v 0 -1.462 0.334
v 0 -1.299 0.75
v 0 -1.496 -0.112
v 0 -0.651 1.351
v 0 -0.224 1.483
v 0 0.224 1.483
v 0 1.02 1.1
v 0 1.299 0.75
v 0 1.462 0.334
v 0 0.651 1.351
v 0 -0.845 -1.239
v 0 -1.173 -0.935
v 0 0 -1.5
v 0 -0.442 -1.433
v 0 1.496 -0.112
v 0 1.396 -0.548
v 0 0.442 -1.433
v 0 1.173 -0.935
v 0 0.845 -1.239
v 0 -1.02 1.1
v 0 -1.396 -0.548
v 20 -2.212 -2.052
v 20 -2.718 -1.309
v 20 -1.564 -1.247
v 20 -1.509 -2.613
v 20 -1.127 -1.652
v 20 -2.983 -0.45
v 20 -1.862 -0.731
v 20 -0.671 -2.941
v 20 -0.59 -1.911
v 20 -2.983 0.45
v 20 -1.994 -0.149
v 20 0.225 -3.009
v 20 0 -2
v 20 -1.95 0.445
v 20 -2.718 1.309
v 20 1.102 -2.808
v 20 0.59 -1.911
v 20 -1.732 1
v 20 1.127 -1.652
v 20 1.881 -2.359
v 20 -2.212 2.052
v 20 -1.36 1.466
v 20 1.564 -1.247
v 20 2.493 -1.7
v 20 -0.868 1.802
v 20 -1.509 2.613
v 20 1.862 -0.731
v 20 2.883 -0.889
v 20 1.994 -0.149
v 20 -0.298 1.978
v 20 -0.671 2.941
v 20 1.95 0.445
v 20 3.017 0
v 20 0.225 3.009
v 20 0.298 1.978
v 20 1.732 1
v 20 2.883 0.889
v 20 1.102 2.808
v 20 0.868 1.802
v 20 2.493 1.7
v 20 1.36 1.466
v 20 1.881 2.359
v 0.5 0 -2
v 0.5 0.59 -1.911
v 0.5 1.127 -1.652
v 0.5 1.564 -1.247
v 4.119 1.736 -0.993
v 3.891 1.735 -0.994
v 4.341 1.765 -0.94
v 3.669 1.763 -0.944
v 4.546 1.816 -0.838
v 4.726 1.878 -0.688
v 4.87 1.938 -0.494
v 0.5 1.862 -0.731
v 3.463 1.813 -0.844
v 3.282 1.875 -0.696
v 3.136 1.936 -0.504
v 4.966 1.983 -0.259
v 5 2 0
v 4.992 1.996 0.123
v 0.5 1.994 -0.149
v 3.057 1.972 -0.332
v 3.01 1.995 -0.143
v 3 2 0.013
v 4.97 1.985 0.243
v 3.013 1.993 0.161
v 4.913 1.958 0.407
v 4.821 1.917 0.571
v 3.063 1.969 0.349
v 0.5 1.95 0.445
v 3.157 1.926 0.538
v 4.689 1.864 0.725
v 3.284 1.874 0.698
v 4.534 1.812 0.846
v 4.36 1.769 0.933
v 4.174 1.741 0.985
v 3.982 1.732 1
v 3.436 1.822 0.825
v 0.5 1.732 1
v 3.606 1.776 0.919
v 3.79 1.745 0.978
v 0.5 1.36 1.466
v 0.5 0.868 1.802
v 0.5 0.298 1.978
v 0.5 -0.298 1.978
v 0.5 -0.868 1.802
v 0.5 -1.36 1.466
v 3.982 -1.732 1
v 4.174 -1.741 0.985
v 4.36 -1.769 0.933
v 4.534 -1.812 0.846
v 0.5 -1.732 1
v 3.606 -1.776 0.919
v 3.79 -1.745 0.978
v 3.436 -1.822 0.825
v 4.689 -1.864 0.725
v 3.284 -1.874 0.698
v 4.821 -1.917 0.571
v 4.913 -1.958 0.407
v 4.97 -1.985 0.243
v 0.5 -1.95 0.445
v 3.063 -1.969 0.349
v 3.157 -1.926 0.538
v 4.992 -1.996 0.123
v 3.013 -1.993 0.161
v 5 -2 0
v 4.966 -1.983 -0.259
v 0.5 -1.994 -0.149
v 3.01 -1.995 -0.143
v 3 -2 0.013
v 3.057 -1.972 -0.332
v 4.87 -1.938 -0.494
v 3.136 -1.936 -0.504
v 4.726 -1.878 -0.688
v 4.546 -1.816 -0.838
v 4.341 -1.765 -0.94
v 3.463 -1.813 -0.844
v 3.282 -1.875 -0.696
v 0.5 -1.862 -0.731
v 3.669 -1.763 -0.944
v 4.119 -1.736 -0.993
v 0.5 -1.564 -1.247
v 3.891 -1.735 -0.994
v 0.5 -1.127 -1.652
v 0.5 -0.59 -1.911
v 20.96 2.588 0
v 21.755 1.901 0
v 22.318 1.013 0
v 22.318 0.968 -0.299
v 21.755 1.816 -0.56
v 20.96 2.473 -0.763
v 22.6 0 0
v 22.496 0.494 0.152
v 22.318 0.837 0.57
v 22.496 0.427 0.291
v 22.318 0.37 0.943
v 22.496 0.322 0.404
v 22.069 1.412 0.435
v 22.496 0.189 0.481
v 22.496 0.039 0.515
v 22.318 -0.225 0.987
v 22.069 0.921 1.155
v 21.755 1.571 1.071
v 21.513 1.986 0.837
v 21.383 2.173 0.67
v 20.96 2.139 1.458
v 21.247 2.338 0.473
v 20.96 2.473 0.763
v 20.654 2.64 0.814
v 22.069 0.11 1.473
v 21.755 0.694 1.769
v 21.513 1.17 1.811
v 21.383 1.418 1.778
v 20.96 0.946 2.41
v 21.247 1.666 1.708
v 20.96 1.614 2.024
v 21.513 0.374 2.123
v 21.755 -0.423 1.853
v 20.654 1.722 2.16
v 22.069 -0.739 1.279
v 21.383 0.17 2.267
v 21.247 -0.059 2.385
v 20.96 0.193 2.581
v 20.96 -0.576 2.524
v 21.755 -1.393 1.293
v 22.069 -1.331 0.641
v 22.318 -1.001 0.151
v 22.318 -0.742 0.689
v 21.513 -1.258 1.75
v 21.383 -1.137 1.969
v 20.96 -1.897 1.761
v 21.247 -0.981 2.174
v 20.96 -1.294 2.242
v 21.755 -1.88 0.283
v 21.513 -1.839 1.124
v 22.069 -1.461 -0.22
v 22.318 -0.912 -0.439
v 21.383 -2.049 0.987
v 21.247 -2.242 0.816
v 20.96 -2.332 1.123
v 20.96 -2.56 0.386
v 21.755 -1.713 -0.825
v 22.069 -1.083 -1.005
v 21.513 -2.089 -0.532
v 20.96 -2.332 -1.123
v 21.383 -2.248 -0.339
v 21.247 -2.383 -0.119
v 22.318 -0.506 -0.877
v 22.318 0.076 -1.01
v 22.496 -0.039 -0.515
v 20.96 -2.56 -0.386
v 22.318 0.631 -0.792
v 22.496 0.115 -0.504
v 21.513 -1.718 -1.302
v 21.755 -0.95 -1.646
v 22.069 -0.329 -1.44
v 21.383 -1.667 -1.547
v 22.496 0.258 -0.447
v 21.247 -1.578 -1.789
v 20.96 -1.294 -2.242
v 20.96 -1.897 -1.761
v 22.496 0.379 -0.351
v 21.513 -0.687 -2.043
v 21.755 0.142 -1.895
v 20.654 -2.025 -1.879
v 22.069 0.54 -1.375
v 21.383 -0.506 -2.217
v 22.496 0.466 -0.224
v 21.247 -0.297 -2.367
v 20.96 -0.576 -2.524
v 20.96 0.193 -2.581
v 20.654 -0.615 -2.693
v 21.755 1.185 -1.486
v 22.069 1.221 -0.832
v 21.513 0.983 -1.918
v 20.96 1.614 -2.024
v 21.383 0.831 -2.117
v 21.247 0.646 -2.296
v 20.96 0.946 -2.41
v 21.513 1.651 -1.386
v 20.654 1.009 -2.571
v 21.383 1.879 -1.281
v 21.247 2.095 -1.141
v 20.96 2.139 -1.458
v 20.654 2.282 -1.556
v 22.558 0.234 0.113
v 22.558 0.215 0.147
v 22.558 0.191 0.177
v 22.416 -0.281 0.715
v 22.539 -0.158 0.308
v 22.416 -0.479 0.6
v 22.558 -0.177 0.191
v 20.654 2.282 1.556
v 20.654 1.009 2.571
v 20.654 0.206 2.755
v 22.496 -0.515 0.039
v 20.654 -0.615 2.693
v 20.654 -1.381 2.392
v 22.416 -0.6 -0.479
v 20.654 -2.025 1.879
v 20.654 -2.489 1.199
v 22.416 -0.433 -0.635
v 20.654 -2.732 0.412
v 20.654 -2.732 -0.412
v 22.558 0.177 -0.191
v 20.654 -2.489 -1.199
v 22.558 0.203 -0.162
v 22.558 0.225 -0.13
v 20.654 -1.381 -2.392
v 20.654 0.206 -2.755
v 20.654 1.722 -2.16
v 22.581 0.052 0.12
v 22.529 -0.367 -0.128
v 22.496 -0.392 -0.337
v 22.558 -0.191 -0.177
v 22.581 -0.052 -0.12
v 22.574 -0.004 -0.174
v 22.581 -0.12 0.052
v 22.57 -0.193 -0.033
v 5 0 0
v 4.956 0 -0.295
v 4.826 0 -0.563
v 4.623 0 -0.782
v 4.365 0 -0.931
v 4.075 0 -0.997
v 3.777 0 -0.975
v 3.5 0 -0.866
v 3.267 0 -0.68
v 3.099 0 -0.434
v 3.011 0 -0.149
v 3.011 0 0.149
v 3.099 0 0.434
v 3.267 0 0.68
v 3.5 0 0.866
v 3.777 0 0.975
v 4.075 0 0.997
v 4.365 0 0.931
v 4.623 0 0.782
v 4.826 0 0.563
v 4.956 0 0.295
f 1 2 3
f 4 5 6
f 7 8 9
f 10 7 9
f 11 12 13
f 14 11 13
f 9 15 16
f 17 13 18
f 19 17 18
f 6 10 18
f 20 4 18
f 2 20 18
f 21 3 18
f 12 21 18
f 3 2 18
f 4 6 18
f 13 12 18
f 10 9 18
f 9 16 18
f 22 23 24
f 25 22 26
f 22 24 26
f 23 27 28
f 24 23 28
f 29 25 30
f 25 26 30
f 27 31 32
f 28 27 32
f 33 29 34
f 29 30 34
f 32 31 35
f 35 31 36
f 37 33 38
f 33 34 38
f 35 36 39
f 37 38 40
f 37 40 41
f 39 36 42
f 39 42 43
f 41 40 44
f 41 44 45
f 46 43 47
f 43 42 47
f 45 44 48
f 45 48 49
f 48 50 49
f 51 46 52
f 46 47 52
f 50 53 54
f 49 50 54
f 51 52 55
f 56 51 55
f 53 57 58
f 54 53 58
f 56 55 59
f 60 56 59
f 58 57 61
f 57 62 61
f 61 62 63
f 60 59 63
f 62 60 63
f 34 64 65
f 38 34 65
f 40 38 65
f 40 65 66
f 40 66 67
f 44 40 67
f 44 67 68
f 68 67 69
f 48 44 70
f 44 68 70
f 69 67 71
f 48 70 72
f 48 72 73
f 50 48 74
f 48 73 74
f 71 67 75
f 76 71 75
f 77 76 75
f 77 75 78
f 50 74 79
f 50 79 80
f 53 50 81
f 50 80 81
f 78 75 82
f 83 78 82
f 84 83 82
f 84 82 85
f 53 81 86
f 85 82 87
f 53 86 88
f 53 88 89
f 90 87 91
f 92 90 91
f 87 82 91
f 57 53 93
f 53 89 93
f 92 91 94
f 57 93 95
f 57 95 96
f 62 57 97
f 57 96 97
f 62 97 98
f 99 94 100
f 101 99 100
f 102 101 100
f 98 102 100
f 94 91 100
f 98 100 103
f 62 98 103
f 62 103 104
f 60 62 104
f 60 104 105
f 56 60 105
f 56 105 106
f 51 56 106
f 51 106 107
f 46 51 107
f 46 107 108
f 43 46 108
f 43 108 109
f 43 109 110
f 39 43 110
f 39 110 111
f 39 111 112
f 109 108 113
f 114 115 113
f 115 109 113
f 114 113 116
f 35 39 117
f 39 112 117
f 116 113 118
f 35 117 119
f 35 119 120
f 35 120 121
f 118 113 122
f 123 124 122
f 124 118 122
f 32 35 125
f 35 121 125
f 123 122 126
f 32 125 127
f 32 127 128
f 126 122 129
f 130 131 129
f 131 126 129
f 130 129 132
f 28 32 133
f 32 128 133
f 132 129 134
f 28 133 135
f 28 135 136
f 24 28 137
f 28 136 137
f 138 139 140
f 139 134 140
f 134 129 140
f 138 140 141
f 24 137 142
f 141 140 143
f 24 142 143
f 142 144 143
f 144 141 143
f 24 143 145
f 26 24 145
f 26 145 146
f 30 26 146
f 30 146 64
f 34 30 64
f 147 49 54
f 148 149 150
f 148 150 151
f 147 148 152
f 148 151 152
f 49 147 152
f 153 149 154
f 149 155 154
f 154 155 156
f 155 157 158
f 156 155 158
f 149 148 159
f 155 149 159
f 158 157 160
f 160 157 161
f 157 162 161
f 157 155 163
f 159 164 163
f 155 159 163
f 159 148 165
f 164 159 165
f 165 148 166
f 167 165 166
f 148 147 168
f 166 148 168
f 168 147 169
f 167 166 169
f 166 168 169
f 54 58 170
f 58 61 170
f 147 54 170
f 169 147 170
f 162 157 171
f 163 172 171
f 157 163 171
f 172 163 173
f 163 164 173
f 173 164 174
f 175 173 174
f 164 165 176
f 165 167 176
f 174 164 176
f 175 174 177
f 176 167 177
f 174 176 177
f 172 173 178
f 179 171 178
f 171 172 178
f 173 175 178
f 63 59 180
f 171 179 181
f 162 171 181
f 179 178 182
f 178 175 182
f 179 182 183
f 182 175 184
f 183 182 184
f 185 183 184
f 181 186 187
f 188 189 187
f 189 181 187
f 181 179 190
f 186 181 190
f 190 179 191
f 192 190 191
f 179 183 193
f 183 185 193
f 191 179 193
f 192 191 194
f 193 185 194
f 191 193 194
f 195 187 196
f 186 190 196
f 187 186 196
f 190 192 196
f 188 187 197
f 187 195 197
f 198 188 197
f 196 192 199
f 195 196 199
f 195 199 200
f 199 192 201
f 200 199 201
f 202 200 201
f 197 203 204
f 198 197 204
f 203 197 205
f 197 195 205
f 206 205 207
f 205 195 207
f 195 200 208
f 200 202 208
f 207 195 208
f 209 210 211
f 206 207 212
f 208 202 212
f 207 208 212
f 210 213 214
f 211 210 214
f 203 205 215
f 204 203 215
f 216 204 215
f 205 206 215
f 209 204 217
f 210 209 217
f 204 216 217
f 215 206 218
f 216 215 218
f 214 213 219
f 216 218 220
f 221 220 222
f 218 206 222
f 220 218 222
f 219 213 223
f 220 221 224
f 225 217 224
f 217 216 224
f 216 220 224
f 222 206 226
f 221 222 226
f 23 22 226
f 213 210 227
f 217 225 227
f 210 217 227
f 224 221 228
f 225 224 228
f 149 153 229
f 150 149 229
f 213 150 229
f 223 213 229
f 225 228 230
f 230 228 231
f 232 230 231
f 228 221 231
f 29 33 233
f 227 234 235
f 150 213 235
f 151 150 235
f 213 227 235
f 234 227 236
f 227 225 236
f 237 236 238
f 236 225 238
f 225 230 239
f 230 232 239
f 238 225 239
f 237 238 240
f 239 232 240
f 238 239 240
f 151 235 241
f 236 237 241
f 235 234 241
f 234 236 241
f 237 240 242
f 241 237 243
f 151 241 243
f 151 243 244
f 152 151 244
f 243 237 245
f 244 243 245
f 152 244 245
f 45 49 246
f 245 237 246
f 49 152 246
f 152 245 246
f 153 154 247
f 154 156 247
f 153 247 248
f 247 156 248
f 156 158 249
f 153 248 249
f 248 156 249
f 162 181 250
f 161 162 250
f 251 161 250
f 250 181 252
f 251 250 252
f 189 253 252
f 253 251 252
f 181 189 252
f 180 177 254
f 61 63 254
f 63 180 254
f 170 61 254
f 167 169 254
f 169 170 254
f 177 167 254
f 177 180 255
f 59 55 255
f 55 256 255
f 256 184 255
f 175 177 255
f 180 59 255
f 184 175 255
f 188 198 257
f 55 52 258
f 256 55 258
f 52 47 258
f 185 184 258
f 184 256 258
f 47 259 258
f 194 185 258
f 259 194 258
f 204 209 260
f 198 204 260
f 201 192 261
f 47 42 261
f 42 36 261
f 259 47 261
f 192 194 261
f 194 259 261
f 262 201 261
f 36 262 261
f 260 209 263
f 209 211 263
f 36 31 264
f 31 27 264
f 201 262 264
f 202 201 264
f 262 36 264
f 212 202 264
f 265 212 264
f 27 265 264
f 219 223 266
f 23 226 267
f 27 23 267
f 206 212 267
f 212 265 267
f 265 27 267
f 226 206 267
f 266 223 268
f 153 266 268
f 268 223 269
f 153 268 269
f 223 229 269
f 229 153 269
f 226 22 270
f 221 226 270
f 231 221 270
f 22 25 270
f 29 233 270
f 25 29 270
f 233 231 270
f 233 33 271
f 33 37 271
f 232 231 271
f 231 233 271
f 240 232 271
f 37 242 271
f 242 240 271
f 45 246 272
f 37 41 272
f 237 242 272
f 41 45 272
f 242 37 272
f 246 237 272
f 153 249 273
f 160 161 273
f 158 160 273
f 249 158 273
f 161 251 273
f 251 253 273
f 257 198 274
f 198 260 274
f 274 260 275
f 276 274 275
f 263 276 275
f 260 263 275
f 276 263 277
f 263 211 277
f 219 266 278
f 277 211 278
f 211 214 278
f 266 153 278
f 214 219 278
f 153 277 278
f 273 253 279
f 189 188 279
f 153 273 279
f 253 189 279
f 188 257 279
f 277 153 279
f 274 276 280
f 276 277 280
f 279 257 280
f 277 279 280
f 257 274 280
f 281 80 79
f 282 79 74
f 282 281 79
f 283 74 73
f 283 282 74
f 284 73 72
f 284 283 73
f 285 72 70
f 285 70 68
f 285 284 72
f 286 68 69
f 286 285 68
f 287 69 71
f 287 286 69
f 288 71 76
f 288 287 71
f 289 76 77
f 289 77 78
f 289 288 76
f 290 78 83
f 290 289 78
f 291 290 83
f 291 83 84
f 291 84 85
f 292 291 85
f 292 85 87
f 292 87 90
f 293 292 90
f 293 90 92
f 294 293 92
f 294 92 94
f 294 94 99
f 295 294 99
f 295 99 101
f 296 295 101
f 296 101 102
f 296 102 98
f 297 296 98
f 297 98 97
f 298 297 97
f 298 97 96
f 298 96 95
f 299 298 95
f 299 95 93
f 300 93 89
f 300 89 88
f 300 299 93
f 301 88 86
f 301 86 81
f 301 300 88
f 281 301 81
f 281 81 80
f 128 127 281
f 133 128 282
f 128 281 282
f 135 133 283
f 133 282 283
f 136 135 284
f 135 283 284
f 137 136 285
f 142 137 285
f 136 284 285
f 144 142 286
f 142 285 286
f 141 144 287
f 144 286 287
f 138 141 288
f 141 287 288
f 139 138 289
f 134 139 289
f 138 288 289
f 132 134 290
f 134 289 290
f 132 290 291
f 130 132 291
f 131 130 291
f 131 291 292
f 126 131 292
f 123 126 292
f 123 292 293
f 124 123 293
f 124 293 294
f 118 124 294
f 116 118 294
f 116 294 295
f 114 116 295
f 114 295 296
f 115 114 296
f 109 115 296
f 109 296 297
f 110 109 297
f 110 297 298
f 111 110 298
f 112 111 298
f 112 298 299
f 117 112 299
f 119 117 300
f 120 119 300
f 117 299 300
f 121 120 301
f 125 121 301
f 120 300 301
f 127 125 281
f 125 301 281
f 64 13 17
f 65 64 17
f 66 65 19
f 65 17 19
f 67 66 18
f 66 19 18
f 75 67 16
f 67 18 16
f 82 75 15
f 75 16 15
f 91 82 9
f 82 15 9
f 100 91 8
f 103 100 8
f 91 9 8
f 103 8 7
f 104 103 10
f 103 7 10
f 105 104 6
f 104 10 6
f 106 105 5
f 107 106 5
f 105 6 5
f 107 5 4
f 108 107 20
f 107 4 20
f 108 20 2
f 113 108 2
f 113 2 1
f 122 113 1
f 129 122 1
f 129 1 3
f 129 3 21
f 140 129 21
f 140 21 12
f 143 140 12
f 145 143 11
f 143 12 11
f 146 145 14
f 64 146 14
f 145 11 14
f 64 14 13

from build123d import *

# Parameters (mm, degrees)
SKETCH1_R               = 2
BOSS_EXTRUDE1_DEPTH     = 20
CHAMFER1_SIZE           = 0.5
SKETCH2_R               = 1
CUT_EXTRUDE1_DEPTH      = 3
CUT_EXTRUDE1_DEPTH_BACK = 3


with BuildPart() as part:
    # Sketch1 → Boss-Extrude1 (new body)
    with BuildSketch(Plane(origin=(0, 0, 0), x_dir=(0, 0, -1), z_dir=(1, 0, 0))):
        Circle(SKETCH1_R)
    extrude(amount=BOSS_EXTRUDE1_DEPTH)

    # Chamfer1
    chamfer1_edges = [part.edges().sort_by_distance(p)[0] for p in [
        (0, 0, 2),
    ]]
    chamfer(chamfer1_edges, length=CHAMFER1_SIZE)

    # Sketch2 → Cut-Extrude1 (cut, two sides)
    with BuildSketch(Plane(origin=(0, 0, 0), x_dir=(1, 0, 0), z_dir=(0, 1, 0))) as cut_extrude1_sk:
        with Locations((4, 0)):
            Circle(SKETCH2_R)
    extrude(amount=CUT_EXTRUDE1_DEPTH, mode=Mode.SUBTRACT)
    extrude(cut_extrude1_sk.sketch, amount=-CUT_EXTRUDE1_DEPTH_BACK, mode=Mode.SUBTRACT)

    # Sketch4 → Revolve1 (revolve)
    with BuildSketch(Plane.XY):
        with BuildLine():
            Line((20, 3.017004448), (20, 0))
            Line((20, 0), (22.6, 0))
            ThreePointArc((22.6, 0), (21.755214952, 1.900798256), (20, 3.017004448))
        make_face()
    revolve(axis=Axis((19, 0, 0), (1, 0, 0)))


solid = part.part
